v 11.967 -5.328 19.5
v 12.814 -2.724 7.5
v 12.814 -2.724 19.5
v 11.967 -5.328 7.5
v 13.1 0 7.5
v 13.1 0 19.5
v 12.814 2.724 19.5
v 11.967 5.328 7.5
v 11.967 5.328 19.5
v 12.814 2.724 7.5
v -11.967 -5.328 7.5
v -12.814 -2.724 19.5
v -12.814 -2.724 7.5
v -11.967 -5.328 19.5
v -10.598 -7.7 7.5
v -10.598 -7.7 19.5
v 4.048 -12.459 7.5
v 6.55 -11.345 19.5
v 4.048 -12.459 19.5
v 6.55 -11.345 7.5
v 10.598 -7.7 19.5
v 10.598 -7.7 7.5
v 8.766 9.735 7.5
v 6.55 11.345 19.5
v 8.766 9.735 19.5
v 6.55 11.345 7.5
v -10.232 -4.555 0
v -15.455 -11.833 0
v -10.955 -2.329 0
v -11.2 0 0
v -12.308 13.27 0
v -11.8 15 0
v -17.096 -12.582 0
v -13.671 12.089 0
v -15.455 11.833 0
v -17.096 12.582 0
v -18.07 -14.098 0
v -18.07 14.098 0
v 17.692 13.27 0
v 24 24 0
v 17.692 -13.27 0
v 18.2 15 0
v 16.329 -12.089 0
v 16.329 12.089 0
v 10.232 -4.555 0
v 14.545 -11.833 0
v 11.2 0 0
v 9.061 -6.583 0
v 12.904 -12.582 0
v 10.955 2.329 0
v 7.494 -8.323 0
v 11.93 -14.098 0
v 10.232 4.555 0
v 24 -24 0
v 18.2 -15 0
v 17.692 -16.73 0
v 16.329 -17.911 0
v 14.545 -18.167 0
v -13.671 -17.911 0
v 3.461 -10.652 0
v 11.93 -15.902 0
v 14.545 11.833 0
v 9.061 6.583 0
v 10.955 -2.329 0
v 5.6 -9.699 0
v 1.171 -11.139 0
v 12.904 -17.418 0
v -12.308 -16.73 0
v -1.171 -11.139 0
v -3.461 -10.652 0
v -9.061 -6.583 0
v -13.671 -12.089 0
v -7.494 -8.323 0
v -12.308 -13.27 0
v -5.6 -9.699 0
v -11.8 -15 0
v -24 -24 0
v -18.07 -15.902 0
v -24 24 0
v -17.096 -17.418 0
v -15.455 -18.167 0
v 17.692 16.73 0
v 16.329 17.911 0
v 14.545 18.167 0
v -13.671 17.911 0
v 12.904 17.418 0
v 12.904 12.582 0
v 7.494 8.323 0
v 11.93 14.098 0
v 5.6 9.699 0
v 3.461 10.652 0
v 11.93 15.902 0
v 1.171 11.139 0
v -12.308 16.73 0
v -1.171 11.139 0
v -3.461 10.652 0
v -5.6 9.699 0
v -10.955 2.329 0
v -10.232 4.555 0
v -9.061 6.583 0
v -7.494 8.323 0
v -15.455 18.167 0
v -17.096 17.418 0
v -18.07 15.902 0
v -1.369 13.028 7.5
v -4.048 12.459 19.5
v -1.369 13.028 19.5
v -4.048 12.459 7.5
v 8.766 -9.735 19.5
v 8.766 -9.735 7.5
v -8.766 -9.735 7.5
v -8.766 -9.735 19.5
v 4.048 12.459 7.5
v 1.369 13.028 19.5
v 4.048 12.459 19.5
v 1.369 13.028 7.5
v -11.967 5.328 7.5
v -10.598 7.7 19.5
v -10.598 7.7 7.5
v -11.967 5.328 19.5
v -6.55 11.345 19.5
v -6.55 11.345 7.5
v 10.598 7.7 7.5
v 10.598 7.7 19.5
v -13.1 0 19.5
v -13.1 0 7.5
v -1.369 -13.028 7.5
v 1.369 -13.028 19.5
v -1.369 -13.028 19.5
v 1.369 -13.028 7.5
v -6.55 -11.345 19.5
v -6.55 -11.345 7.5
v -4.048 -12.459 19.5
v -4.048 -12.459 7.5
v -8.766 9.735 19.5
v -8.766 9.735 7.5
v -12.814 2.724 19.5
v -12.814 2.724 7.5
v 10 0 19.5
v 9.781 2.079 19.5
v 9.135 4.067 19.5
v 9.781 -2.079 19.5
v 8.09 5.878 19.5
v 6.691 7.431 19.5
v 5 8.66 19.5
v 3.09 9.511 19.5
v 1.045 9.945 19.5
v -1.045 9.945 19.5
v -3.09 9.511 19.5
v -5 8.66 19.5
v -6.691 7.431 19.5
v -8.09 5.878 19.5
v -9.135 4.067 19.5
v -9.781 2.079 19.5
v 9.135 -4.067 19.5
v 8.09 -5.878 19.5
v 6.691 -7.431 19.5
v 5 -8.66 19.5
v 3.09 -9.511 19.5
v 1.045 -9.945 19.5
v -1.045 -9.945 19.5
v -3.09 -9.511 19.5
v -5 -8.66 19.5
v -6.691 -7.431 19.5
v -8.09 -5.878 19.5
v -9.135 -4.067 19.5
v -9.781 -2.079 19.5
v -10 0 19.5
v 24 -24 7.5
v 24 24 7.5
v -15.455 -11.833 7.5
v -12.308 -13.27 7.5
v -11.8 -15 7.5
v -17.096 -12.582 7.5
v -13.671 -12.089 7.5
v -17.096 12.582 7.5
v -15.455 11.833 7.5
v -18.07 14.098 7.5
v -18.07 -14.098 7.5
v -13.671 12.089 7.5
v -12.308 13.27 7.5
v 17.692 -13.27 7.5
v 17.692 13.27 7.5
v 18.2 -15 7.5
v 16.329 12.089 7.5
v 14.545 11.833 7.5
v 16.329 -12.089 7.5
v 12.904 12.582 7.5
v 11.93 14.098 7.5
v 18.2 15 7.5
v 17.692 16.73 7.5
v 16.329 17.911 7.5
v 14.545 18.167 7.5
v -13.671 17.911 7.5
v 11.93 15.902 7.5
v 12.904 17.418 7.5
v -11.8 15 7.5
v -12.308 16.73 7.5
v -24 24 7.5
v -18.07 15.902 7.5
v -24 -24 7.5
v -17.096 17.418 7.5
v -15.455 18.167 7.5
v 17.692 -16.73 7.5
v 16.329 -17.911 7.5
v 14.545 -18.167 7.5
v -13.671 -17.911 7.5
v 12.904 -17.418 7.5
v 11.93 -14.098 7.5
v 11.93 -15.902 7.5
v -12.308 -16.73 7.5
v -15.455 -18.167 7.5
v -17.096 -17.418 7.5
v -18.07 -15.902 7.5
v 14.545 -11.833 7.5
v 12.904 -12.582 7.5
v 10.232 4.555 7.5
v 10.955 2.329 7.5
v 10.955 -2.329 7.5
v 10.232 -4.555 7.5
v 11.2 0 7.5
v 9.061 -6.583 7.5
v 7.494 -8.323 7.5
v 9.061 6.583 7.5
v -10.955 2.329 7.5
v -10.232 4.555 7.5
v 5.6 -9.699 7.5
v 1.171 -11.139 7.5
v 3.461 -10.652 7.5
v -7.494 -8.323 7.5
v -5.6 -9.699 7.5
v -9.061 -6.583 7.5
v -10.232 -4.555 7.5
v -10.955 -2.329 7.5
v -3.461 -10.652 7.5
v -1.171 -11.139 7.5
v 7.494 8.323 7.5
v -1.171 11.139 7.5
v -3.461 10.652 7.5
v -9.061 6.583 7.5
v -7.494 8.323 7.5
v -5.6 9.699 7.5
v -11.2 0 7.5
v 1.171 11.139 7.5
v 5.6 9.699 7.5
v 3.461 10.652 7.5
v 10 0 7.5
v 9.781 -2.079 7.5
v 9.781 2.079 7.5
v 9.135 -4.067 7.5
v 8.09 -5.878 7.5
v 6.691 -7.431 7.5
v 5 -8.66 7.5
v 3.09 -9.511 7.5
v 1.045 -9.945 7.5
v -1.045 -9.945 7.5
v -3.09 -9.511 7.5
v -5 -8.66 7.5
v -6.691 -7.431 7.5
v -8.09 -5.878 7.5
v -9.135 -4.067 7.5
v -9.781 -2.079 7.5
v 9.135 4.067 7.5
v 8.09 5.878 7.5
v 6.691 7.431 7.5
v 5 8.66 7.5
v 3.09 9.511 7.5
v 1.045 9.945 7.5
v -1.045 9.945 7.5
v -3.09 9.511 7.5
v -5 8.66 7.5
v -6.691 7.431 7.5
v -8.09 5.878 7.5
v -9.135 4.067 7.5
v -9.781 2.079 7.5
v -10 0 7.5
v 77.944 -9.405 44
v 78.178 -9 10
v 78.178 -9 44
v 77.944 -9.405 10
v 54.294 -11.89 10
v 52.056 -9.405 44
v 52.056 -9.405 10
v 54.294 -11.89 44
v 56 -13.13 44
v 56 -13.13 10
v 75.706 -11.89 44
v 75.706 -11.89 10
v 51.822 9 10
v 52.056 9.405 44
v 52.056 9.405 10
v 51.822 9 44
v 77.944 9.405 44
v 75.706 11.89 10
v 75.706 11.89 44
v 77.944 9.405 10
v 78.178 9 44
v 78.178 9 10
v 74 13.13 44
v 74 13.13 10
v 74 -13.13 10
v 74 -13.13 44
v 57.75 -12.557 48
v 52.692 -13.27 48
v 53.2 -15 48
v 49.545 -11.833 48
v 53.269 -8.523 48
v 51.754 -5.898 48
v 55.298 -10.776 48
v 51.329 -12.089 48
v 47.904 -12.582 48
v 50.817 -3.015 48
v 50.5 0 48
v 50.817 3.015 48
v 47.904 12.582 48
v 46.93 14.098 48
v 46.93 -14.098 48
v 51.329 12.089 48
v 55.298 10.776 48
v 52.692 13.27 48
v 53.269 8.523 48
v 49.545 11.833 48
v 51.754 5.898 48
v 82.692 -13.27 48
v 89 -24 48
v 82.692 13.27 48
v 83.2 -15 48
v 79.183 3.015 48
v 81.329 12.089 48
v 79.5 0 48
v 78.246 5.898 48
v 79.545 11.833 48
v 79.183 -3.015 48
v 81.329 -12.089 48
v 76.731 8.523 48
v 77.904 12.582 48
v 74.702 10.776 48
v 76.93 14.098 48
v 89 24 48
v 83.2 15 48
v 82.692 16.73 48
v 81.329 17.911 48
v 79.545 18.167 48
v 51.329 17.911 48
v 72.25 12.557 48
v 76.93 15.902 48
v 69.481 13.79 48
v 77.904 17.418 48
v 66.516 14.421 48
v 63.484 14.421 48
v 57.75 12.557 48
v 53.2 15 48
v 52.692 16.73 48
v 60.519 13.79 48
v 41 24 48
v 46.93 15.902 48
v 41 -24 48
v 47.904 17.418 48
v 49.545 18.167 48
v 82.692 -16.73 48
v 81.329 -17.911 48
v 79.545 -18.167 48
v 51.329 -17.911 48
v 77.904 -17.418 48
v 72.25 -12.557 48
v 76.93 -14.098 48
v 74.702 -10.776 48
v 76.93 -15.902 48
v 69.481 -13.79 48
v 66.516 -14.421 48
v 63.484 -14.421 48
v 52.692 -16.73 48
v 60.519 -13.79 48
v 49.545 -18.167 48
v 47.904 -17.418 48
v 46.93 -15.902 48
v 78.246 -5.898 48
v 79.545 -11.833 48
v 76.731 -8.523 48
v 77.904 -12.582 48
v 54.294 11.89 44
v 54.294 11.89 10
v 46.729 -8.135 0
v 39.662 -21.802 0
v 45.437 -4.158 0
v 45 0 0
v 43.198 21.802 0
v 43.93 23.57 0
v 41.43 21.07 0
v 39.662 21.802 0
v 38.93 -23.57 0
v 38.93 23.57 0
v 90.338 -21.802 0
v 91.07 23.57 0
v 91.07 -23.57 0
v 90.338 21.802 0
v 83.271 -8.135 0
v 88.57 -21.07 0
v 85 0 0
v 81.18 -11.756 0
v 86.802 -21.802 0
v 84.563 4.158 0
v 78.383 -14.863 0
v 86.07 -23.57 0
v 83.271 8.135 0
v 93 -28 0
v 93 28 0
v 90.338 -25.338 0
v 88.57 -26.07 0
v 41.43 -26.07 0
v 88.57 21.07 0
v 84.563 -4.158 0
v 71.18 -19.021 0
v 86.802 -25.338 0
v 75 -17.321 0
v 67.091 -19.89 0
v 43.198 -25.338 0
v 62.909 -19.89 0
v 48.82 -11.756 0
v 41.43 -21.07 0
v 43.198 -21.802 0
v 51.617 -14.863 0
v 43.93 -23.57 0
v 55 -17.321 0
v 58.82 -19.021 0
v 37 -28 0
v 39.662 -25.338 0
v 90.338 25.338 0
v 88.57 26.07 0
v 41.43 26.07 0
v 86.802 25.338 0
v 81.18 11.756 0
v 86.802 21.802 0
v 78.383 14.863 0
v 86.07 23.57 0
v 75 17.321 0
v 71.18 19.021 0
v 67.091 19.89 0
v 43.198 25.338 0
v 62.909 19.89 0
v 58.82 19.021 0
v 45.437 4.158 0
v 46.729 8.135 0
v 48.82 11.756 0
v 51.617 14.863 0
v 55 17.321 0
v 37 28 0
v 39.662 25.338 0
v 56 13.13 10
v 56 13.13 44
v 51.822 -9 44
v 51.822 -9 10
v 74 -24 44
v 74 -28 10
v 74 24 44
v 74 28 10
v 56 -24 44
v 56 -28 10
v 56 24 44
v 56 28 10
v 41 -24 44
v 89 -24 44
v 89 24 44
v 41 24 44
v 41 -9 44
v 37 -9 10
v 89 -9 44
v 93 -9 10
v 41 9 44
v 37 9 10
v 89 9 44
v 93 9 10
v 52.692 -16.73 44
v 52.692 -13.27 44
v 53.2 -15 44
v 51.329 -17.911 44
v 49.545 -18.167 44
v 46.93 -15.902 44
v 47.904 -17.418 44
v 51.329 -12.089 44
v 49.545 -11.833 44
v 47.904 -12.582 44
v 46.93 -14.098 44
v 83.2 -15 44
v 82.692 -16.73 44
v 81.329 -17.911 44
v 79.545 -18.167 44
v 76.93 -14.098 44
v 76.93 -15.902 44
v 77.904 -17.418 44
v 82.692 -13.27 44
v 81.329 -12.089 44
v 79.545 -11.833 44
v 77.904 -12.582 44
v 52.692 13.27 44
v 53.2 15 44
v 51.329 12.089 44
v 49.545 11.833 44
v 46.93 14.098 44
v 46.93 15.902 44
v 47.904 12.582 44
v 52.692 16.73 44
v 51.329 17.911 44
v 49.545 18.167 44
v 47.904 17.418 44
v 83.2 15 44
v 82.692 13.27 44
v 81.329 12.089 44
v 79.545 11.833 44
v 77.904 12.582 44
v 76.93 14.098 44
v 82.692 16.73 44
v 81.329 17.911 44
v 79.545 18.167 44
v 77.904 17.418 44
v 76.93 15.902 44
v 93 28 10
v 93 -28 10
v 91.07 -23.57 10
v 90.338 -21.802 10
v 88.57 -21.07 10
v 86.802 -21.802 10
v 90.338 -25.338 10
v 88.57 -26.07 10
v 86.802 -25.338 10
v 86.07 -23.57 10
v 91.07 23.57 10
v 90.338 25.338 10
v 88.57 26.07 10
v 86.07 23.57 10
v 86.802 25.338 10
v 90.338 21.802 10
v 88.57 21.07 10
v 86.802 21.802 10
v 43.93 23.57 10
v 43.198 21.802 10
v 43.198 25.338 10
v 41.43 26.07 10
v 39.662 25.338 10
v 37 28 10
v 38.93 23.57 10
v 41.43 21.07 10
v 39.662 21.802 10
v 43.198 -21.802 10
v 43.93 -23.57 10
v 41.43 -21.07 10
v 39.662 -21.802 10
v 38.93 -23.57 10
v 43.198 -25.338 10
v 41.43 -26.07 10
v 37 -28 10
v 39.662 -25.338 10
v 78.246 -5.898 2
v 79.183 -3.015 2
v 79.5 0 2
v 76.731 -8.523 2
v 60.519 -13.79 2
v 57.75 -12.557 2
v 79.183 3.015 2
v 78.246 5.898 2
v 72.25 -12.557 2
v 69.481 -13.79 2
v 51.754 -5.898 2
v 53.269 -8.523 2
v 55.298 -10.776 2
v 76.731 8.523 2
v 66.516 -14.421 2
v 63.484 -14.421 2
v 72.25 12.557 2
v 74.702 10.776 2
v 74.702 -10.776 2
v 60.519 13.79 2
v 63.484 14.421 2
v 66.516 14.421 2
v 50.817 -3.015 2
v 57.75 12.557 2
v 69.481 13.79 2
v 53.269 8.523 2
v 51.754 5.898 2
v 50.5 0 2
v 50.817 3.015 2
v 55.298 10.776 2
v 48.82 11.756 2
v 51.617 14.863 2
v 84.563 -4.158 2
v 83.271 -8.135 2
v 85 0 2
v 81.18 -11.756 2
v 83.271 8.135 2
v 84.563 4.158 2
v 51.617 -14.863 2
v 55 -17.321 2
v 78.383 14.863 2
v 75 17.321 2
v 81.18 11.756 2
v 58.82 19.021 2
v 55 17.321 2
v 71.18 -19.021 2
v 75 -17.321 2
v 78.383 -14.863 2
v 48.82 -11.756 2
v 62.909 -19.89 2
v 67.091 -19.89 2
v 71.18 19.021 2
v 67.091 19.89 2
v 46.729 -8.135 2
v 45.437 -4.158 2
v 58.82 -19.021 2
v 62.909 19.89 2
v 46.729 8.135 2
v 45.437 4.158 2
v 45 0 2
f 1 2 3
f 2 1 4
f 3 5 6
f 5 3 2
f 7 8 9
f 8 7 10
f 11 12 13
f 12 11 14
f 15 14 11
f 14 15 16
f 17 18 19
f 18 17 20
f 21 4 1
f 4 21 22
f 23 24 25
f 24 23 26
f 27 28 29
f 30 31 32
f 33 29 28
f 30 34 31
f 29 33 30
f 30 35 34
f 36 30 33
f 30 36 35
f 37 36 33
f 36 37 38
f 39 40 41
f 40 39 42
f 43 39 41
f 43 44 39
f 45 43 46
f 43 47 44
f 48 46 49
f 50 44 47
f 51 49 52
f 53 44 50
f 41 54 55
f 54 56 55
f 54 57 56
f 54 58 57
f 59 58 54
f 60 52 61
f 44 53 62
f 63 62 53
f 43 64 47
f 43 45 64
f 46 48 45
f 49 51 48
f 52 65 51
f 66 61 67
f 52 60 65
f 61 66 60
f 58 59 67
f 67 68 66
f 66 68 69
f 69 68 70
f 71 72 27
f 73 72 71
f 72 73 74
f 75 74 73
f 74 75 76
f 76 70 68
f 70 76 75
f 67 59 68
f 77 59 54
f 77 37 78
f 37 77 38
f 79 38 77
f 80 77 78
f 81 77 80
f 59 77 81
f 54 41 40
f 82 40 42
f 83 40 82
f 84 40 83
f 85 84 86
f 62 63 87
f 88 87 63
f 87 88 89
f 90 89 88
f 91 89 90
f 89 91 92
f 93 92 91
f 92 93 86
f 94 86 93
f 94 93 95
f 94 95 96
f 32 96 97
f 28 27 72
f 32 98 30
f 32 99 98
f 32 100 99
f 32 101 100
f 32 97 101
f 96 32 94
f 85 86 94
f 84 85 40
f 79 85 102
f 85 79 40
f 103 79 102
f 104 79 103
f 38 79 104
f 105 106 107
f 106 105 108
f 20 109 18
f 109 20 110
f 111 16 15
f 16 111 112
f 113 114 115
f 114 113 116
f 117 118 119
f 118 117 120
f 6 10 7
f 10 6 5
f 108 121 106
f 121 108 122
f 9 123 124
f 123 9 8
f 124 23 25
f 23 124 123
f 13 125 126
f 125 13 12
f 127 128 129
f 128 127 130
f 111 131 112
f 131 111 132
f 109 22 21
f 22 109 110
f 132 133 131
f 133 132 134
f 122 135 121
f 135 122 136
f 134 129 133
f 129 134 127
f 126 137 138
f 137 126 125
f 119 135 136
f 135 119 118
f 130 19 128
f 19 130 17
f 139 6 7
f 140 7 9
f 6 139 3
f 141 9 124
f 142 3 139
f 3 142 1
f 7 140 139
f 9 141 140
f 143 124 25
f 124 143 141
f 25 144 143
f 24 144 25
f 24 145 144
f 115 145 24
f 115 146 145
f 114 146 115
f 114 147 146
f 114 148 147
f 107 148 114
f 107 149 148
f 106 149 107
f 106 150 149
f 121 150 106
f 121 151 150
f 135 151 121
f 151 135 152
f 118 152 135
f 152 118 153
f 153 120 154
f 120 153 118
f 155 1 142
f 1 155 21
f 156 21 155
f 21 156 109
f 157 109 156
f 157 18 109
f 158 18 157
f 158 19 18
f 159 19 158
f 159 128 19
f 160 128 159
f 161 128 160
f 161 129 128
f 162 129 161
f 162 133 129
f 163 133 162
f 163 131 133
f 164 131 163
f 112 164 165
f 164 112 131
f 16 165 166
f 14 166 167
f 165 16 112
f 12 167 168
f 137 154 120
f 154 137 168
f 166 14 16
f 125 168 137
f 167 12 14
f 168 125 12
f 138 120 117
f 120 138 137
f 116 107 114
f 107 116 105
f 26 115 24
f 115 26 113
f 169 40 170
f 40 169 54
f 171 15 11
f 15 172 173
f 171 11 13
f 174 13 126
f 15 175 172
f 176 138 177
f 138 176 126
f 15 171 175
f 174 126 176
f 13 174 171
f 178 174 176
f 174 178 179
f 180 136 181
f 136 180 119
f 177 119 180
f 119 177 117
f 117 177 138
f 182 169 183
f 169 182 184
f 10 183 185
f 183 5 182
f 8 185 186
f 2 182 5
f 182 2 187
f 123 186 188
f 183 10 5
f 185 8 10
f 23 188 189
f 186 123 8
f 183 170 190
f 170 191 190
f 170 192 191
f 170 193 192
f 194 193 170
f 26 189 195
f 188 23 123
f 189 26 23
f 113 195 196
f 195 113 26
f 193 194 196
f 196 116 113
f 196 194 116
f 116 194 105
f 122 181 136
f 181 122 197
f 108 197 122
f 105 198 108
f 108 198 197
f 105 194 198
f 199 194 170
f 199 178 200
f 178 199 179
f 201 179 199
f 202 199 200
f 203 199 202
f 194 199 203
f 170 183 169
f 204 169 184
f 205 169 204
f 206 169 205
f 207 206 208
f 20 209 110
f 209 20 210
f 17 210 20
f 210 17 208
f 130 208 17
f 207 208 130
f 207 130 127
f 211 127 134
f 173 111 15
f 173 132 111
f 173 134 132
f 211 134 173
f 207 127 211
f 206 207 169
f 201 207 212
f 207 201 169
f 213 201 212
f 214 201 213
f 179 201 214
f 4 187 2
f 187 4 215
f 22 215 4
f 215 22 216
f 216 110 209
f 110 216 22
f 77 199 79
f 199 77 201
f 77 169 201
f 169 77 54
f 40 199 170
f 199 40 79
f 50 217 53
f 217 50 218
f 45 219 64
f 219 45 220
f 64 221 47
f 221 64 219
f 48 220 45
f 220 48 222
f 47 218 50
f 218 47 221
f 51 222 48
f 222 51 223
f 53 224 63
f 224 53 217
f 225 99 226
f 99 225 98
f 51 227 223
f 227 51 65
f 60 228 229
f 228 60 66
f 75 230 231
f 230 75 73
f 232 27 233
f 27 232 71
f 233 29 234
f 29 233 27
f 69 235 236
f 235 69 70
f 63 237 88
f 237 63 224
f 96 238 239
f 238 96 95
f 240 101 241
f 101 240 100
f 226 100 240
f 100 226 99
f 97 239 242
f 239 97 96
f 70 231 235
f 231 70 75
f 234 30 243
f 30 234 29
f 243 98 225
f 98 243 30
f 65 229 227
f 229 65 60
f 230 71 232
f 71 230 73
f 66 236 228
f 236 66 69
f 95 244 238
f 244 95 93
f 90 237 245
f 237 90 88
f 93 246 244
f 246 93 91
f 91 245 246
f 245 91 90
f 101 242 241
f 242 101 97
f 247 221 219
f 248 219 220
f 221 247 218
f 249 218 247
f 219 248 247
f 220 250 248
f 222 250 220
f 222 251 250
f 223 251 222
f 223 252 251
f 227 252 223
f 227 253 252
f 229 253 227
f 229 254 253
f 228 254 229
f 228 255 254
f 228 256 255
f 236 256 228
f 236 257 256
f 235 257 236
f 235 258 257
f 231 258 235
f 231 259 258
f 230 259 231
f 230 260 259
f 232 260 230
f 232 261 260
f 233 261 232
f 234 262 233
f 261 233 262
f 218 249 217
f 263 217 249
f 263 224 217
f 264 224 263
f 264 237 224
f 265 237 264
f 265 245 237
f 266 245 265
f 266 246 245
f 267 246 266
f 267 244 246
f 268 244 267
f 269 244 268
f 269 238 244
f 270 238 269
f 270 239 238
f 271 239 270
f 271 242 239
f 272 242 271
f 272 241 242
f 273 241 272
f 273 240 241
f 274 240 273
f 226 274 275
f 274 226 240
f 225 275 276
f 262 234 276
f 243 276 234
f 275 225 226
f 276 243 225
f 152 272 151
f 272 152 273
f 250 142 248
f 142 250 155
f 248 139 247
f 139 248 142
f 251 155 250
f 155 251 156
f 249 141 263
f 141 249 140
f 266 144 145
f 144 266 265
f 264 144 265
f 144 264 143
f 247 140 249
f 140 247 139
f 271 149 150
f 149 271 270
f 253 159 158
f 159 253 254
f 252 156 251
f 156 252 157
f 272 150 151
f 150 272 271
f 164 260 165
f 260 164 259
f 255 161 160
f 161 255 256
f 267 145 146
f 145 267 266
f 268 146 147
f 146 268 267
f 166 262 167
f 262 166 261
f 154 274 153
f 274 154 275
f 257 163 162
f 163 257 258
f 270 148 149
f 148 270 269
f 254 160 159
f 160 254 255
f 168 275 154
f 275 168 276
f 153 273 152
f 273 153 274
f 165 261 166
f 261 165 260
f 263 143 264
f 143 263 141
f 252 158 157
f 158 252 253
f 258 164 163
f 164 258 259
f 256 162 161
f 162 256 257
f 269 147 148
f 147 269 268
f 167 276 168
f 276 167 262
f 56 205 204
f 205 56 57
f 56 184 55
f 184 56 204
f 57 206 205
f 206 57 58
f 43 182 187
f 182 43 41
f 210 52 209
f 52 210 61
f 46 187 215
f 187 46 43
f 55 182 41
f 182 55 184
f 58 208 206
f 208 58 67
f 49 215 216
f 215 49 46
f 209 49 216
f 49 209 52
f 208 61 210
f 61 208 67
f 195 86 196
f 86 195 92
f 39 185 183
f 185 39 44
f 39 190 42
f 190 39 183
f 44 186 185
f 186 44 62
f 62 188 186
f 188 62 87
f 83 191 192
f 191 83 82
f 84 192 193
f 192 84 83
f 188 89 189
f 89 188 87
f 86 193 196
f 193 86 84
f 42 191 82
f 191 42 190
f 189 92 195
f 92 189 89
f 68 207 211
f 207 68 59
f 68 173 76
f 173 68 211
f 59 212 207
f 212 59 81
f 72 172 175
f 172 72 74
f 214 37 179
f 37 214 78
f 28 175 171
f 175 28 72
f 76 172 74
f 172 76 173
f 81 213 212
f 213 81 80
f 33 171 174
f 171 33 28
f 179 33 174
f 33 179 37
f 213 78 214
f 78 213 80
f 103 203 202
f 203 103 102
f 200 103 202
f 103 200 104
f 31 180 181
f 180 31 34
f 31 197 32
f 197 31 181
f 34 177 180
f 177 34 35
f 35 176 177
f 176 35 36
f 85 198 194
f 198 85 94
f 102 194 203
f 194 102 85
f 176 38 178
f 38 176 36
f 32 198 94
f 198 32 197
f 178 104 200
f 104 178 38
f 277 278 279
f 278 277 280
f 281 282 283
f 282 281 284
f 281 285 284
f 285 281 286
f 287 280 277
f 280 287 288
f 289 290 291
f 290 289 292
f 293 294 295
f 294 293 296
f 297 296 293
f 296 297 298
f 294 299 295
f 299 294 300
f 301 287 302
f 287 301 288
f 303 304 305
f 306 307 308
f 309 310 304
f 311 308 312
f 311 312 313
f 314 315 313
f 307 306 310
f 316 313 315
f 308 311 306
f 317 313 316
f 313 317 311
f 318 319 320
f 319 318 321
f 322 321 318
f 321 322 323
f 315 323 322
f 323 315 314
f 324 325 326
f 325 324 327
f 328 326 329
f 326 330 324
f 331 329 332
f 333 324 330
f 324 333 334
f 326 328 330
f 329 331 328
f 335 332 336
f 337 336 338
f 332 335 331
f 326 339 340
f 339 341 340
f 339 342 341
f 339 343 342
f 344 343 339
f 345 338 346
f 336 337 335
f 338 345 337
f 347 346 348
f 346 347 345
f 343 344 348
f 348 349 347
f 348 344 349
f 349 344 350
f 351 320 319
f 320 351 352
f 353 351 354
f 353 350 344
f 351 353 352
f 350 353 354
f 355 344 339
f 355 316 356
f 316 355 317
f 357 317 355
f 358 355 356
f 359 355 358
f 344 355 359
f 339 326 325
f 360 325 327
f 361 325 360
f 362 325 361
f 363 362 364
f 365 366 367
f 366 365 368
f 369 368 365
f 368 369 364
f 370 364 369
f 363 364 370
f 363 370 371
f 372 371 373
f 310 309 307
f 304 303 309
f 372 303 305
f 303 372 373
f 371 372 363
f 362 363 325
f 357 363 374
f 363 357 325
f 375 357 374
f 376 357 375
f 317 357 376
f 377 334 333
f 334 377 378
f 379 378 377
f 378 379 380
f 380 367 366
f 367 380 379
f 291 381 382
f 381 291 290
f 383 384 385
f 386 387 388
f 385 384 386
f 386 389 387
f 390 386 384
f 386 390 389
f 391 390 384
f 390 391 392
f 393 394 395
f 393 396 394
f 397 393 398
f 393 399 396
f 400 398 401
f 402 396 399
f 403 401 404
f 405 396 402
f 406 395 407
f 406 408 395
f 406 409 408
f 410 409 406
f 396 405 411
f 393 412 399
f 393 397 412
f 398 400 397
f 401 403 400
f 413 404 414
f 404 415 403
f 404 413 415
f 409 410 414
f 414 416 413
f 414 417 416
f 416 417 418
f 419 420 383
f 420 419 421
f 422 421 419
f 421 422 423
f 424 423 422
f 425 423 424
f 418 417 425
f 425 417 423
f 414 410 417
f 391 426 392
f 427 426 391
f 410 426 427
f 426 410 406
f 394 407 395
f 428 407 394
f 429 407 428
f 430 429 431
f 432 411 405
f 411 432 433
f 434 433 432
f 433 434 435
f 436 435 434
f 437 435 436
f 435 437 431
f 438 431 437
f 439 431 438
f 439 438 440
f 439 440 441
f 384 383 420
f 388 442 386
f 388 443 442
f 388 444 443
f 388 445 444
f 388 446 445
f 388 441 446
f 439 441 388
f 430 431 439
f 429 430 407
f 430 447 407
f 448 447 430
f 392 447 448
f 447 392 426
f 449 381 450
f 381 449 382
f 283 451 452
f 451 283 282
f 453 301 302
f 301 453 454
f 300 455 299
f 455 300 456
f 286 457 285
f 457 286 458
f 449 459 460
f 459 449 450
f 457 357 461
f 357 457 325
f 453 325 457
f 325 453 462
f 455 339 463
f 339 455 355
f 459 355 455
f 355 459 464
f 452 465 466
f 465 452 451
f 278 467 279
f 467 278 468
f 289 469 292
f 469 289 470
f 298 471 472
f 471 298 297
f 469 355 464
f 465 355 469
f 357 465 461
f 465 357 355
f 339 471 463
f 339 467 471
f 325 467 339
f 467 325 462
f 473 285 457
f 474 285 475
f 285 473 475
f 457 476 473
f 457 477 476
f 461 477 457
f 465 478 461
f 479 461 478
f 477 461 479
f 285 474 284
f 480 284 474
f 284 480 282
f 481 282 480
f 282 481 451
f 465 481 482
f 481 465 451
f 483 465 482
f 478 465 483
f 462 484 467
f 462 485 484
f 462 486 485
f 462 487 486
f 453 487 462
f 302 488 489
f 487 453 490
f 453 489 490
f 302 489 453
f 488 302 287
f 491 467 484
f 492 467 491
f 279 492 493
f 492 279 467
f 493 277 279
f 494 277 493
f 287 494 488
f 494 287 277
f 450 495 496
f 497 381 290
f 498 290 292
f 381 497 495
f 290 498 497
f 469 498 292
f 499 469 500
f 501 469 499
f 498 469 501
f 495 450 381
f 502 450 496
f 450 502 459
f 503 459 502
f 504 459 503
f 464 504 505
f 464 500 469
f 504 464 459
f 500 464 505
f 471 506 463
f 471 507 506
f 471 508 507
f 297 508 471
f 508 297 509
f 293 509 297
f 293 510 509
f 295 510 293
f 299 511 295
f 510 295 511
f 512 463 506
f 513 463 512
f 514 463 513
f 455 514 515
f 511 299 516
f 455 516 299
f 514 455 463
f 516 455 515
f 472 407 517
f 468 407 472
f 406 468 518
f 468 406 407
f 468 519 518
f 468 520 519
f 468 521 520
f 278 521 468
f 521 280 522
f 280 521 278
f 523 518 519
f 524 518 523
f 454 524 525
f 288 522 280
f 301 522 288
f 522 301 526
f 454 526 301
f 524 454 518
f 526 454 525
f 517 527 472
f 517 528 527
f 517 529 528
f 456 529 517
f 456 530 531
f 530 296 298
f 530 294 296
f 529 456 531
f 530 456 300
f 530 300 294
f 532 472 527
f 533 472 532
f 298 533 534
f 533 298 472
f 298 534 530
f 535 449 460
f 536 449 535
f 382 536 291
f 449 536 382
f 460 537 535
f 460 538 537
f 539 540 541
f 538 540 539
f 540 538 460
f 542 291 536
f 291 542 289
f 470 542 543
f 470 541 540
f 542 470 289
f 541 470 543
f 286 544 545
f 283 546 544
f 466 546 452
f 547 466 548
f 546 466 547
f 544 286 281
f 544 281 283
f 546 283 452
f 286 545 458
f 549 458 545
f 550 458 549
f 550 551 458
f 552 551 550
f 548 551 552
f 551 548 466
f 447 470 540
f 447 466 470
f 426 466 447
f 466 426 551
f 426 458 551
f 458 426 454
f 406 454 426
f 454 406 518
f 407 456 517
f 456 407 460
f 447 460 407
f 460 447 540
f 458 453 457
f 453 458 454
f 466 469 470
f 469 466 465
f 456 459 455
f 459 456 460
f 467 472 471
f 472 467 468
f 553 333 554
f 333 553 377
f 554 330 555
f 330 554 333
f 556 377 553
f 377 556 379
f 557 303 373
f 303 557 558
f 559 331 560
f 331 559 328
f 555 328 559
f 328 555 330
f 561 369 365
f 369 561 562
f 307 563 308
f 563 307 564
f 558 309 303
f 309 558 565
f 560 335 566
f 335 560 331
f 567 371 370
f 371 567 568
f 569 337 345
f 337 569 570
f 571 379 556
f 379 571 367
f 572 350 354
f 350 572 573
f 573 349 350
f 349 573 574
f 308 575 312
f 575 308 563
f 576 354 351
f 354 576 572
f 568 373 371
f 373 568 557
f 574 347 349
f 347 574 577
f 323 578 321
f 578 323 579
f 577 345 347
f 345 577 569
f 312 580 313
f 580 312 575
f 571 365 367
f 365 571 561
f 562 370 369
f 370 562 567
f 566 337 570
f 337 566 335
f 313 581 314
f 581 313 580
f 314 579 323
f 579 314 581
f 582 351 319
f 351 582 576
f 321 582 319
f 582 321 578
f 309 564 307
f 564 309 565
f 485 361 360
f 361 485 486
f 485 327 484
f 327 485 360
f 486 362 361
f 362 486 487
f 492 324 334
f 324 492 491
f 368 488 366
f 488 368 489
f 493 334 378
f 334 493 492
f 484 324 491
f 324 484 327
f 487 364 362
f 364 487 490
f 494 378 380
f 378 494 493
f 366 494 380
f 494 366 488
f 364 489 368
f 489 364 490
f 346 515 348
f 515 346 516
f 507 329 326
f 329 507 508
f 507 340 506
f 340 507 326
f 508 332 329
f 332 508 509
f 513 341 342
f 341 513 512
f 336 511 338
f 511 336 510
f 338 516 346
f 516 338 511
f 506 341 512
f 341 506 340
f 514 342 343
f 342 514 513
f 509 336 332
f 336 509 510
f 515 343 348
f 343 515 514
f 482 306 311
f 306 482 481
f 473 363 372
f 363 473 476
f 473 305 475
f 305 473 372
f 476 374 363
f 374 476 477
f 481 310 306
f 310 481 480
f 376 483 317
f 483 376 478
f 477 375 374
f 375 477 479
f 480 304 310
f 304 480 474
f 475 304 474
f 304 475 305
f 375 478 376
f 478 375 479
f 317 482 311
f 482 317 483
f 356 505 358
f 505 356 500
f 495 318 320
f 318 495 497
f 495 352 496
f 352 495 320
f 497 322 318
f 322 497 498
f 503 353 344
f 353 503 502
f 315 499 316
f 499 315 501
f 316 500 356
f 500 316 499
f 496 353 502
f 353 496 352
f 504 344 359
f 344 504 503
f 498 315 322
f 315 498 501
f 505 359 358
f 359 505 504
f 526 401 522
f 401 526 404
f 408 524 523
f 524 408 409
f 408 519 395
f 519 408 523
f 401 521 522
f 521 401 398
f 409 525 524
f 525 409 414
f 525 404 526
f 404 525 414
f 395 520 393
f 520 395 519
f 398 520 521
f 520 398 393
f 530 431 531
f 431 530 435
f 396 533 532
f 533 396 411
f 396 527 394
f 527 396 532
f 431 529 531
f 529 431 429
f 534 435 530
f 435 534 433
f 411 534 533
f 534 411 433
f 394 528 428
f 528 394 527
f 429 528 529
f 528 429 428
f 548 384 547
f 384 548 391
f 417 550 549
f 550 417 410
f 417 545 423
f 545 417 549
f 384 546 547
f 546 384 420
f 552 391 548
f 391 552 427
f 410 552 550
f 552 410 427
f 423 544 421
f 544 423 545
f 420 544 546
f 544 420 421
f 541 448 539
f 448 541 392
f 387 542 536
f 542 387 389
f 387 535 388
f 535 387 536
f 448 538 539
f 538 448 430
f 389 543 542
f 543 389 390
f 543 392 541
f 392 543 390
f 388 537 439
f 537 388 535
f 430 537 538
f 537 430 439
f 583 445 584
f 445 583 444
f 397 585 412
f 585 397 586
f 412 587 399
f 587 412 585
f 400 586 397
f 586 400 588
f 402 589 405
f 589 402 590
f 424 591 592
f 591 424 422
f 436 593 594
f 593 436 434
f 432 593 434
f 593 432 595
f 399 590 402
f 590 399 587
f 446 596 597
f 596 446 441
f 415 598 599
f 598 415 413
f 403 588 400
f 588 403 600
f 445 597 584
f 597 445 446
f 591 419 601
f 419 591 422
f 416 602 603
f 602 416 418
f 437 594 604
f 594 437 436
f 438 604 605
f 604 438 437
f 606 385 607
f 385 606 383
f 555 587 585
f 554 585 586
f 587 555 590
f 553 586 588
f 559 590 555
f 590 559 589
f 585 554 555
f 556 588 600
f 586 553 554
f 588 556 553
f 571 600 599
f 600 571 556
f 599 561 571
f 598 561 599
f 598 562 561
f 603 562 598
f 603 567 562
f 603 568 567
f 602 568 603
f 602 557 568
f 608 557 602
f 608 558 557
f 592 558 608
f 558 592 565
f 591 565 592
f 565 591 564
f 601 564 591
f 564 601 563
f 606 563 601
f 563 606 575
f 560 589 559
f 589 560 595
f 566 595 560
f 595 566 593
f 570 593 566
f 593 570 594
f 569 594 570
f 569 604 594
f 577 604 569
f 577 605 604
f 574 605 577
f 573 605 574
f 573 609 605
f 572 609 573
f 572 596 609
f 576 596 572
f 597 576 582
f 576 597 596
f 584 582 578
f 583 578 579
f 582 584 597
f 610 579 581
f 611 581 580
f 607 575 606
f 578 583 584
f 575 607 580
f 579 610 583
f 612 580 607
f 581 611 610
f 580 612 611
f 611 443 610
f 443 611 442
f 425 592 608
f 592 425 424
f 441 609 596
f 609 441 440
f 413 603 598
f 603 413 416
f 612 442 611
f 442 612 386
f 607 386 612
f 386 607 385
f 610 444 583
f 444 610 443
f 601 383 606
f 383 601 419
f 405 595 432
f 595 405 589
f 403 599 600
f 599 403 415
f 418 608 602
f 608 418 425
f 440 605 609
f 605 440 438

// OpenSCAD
module stuetze() {
	translate([9,0,0]) rotate(90, [0,-1,0]) linear_extrude(height=18) polygon([[11.5,24],[11,20],[11,20],[46,20],[46,28],[45.5,28]]);
}

module part1() {
	difference() {
		union() {
			translate([0,0,-12]) cylinder(r=13.1, h=19.5);
			
			translate([-24,-24,0]) cube([48,48,7.5]);
			
		}
		cylinder(r=11.2, h=13);
		translate([0,0,-13]) cylinder(r=10, h=14);
		translate([15,15,-13]) cylinder(r=3.2, h=26);
		translate([15,-15,-13]) cylinder(r=3.2, h=26);
		translate([-15,15,-13]) cylinder(r=3.2, h=26);
		translate([-15,-15,-13]) cylinder(r=3.2, h=26);


	}
}

module part2() {
	difference() {
		union() {
			translate([0,0,7.5]) cylinder(r=16, h=48);
			translate([-9,-24,7.5]) cube([18,48,48]);
			rotate(90,[0,0,1]) translate([-9,-24,7.5]) cube([18,48,48]);
			translate([-24,-24,7.5]) cube([48,48,4]);
			translate([-28,-28,45.5]) cube([56,56,10]);
			
			#stuetze();
			rotate(90,[0,0,1]) stuetze();
			rotate(180,[0,0,1]) stuetze();
			rotate(270,[0,0,1]) stuetze();

			//translate([-10,-24,11.5]) 	//rotate(7.6,[1,0,0]) cube([20,10,30.3]);
			//rotate(90,[0,0,1]) translate([-10,-24,7.5]) rotate(7.6,[1,0,0]) cube([20,10,30.3]);
			//rotate(180,[0,0,1]) translate([-10,-24,7.5]) rotate(7.6,[1,0,0]) cube([20,10,30.3]);
			///rotate(270,[0,0,1]) translate([-10,-24,7.5]) rotate(7.6,[1,0,0]) cube([20,10,30.3]);
		}
		translate([0,0,7]) cylinder(r=14.5, h=49);

		translate([15,15,7]) cylinder(r=3.2, h=5);
		translate([15,-15,7]) cylinder(r=3.2, h=5);
		translate([-15,15,7]) cylinder(r=3.2, h=5);
		translate([-15,-15,7]) cylinder(r=3.2, h=5);

		translate([23.57,23.57,45]) cylinder(r=2.5, h=11);
		translate([23.57,-23.57,45]) cylinder(r=2.5, h=11);
		translate([-23.57,23.57,45]) cylinder(r=2.5, h=11);
		translate([-23.57,-23.57,45]) cylinder(r=2.5, h=11);

		translate([0,0,53.5]) cylinder(r=20, h=9);
		
	}
}

translate([0,0,7.5]) rotate(180,[1,0,0]) 	part1();
translate([0,0,48])  rotate(180,[1,0,0]) translate([65,0,-7.5])
	part2();
